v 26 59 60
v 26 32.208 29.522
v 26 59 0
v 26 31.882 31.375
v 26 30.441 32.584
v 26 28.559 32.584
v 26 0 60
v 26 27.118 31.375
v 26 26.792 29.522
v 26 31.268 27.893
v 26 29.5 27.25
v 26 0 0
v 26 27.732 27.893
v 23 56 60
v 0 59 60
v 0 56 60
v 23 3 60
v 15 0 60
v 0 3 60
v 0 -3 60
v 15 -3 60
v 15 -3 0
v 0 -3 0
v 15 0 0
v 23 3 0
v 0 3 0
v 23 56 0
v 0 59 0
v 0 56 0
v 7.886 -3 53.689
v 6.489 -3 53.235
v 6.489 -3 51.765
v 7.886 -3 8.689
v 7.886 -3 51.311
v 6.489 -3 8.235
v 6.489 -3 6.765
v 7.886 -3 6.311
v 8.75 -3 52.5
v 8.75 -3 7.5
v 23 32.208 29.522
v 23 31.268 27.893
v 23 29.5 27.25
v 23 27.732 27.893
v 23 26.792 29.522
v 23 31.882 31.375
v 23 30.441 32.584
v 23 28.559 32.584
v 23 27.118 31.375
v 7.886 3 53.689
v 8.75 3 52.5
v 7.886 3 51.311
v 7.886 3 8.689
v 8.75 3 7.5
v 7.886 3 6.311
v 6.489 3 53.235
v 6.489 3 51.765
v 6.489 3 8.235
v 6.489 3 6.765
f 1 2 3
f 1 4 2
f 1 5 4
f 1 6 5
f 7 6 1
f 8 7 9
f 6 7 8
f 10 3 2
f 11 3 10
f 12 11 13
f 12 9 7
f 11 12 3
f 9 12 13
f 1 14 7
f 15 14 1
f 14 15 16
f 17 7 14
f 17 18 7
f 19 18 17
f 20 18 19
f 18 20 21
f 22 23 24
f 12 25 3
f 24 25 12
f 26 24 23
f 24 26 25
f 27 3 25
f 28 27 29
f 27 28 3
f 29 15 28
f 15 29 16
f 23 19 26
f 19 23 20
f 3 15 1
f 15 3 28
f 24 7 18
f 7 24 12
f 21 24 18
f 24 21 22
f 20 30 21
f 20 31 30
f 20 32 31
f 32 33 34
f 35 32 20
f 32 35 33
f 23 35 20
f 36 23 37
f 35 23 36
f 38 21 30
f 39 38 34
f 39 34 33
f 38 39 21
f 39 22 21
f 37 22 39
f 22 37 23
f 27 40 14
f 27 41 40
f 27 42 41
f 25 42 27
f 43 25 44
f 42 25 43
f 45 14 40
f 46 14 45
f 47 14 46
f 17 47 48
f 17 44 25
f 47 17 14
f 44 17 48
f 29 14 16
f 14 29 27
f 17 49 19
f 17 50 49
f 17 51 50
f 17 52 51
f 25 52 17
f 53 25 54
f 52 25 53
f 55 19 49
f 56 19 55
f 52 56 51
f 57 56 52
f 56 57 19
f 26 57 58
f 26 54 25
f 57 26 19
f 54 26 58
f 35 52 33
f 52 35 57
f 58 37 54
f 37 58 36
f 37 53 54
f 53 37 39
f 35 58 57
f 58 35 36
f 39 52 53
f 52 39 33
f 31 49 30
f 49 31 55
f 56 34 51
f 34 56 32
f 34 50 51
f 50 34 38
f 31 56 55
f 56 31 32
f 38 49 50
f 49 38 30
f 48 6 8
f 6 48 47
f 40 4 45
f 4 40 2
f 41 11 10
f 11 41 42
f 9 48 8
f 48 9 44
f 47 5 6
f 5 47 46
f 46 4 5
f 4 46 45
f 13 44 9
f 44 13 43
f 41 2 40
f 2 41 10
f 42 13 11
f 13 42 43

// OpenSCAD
// front to back 52
// width 23

railDepth = 53;
railWidth = 23;
clipHeight = 60;
clipThick = 3;
mountHole = 5.5;
blockWidth = 15;
blockHeight = 60;
blockDepth = 3;
blockScrewDiamater = 2.5;
blockScrewHeight = 10;
blockScrewSpace = 45;

difference(){
		union(){
			cube([railWidth+(clipThick),railDepth+(clipThick*2),clipHeight]);
			translate([0,-blockDepth,0]) cube([blockWidth,blockDepth,blockHeight]);
		}
		// Remove the shape of the door rail
    translate([-1,clipThick,-1])cube([railWidth+1,railDepth,clipHeight+2]);
		// Remove bottom screw
    translate([blockWidth/2,-blockDepth-1,blockHeight/2-blockScrewSpace/2]) rotate([270,0,0])
        #cylinder(d=blockScrewDiamater, h=blockScrewHeight+1);
		// Remove top screw
    translate([blockWidth/2,-blockDepth-1,blockHeight/2+blockScrewSpace/2]) rotate([270,0,0])
        #cylinder(d=blockScrewDiamater, h=blockScrewHeight+1);
		// Remove rail mounting hole
		#translate([railWidth-1,railDepth/2+clipThick,clipHeight/2]) rotate([0,90,0]) cylinder(d=mountHole, h=clipThick+2);
}
